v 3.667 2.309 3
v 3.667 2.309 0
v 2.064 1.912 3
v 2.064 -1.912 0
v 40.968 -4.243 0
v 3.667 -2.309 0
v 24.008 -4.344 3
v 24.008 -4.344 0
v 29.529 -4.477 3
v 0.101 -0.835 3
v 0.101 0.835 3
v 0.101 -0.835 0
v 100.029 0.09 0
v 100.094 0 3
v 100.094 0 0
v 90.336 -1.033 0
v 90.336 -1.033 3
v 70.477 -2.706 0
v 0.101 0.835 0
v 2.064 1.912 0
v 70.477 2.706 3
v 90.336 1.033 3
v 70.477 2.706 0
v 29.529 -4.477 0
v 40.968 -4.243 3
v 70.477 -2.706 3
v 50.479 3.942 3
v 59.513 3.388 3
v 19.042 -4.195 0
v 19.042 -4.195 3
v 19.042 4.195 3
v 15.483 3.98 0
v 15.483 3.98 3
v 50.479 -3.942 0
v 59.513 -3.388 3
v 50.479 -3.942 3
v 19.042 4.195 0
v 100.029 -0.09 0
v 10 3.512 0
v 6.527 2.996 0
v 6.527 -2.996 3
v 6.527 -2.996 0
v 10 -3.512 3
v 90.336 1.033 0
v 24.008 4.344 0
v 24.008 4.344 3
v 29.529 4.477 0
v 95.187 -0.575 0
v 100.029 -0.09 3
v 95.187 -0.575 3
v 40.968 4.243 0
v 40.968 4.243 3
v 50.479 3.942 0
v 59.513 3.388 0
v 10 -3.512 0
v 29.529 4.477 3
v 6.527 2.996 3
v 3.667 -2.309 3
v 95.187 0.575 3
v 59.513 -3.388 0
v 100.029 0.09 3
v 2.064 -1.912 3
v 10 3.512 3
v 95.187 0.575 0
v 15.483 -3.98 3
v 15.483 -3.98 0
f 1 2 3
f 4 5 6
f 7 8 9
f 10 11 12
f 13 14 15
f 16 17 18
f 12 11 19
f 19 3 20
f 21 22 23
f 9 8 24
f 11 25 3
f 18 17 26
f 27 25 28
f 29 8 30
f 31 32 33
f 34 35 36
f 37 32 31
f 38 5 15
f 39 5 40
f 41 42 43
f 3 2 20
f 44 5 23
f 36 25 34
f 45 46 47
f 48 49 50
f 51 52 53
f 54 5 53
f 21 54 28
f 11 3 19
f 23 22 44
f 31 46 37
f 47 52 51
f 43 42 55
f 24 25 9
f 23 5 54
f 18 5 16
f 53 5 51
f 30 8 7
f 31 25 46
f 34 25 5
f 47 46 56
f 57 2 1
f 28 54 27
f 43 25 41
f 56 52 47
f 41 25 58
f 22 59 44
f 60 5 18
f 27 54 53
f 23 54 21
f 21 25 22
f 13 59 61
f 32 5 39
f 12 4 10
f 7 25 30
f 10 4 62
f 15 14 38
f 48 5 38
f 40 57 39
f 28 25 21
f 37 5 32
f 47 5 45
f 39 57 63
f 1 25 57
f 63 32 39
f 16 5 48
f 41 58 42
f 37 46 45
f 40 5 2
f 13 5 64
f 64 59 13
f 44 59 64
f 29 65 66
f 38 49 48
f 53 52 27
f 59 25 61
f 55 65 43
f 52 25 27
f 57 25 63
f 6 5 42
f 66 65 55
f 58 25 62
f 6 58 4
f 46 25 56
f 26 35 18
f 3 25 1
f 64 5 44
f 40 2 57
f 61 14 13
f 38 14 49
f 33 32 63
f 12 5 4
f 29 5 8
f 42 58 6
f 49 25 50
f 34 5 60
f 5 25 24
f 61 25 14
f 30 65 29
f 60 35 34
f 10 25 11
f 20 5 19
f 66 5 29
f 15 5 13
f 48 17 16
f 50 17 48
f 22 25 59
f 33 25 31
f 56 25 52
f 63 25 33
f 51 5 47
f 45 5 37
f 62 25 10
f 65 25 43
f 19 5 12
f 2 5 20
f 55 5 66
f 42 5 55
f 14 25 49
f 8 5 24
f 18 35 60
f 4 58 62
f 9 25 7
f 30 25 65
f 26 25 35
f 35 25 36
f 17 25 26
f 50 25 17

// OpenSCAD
module naca0009(chord, height)
{
  hull() {
    translate([0.000000 * chord,0,0]) cylinder(r = 0.000000 * chord, h = height);
    translate([0.012500 * chord,0,0]) cylinder(r = 0.014204 * chord, h = height);
    translate([0.025000 * chord,0,0]) cylinder(r = 0.019610 * chord, h = height);
    translate([0.050000 * chord,0,0]) cylinder(r = 0.026660 * chord, h = height);
    translate([0.075000 * chord,0,0]) cylinder(r = 0.031499 * chord, h = height);
    translate([0.100000 * chord,0,0]) cylinder(r = 0.035121 * chord, h = height);
    translate([0.150000 * chord,0,0]) cylinder(r = 0.040089 * chord, h = height);
    translate([0.200000 * chord,0,0]) cylinder(r = 0.043032 * chord, h = height);
    translate([0.250000 * chord,0,0]) cylinder(r = 0.044559 * chord, h = height);
    translate([0.300000 * chord,0,0]) cylinder(r = 0.045013 * chord, h = height);
    translate([0.400000 * chord,0,0]) cylinder(r = 0.043523 * chord, h = height);
    translate([0.500000 * chord,0,0]) cylinder(r = 0.039705 * chord, h = height);
    translate([0.600000 * chord,0,0]) cylinder(r = 0.034225 * chord, h = height);
    translate([0.700000 * chord,0,0]) cylinder(r = 0.027479 * chord, h = height);
    translate([0.800000 * chord,0,0]) cylinder(r = 0.019673 * chord, h = height);
    translate([0.900000 * chord,0,0]) cylinder(r = 0.010858 * chord, h = height);
    translate([0.950000 * chord,0,0]) cylinder(r = 0.006049 * chord, h = height);
    translate([1.000000 * chord,0,0]) cylinder(r = 0.000945 * chord, h = height);
  }
}

naca0009(100, 3);
